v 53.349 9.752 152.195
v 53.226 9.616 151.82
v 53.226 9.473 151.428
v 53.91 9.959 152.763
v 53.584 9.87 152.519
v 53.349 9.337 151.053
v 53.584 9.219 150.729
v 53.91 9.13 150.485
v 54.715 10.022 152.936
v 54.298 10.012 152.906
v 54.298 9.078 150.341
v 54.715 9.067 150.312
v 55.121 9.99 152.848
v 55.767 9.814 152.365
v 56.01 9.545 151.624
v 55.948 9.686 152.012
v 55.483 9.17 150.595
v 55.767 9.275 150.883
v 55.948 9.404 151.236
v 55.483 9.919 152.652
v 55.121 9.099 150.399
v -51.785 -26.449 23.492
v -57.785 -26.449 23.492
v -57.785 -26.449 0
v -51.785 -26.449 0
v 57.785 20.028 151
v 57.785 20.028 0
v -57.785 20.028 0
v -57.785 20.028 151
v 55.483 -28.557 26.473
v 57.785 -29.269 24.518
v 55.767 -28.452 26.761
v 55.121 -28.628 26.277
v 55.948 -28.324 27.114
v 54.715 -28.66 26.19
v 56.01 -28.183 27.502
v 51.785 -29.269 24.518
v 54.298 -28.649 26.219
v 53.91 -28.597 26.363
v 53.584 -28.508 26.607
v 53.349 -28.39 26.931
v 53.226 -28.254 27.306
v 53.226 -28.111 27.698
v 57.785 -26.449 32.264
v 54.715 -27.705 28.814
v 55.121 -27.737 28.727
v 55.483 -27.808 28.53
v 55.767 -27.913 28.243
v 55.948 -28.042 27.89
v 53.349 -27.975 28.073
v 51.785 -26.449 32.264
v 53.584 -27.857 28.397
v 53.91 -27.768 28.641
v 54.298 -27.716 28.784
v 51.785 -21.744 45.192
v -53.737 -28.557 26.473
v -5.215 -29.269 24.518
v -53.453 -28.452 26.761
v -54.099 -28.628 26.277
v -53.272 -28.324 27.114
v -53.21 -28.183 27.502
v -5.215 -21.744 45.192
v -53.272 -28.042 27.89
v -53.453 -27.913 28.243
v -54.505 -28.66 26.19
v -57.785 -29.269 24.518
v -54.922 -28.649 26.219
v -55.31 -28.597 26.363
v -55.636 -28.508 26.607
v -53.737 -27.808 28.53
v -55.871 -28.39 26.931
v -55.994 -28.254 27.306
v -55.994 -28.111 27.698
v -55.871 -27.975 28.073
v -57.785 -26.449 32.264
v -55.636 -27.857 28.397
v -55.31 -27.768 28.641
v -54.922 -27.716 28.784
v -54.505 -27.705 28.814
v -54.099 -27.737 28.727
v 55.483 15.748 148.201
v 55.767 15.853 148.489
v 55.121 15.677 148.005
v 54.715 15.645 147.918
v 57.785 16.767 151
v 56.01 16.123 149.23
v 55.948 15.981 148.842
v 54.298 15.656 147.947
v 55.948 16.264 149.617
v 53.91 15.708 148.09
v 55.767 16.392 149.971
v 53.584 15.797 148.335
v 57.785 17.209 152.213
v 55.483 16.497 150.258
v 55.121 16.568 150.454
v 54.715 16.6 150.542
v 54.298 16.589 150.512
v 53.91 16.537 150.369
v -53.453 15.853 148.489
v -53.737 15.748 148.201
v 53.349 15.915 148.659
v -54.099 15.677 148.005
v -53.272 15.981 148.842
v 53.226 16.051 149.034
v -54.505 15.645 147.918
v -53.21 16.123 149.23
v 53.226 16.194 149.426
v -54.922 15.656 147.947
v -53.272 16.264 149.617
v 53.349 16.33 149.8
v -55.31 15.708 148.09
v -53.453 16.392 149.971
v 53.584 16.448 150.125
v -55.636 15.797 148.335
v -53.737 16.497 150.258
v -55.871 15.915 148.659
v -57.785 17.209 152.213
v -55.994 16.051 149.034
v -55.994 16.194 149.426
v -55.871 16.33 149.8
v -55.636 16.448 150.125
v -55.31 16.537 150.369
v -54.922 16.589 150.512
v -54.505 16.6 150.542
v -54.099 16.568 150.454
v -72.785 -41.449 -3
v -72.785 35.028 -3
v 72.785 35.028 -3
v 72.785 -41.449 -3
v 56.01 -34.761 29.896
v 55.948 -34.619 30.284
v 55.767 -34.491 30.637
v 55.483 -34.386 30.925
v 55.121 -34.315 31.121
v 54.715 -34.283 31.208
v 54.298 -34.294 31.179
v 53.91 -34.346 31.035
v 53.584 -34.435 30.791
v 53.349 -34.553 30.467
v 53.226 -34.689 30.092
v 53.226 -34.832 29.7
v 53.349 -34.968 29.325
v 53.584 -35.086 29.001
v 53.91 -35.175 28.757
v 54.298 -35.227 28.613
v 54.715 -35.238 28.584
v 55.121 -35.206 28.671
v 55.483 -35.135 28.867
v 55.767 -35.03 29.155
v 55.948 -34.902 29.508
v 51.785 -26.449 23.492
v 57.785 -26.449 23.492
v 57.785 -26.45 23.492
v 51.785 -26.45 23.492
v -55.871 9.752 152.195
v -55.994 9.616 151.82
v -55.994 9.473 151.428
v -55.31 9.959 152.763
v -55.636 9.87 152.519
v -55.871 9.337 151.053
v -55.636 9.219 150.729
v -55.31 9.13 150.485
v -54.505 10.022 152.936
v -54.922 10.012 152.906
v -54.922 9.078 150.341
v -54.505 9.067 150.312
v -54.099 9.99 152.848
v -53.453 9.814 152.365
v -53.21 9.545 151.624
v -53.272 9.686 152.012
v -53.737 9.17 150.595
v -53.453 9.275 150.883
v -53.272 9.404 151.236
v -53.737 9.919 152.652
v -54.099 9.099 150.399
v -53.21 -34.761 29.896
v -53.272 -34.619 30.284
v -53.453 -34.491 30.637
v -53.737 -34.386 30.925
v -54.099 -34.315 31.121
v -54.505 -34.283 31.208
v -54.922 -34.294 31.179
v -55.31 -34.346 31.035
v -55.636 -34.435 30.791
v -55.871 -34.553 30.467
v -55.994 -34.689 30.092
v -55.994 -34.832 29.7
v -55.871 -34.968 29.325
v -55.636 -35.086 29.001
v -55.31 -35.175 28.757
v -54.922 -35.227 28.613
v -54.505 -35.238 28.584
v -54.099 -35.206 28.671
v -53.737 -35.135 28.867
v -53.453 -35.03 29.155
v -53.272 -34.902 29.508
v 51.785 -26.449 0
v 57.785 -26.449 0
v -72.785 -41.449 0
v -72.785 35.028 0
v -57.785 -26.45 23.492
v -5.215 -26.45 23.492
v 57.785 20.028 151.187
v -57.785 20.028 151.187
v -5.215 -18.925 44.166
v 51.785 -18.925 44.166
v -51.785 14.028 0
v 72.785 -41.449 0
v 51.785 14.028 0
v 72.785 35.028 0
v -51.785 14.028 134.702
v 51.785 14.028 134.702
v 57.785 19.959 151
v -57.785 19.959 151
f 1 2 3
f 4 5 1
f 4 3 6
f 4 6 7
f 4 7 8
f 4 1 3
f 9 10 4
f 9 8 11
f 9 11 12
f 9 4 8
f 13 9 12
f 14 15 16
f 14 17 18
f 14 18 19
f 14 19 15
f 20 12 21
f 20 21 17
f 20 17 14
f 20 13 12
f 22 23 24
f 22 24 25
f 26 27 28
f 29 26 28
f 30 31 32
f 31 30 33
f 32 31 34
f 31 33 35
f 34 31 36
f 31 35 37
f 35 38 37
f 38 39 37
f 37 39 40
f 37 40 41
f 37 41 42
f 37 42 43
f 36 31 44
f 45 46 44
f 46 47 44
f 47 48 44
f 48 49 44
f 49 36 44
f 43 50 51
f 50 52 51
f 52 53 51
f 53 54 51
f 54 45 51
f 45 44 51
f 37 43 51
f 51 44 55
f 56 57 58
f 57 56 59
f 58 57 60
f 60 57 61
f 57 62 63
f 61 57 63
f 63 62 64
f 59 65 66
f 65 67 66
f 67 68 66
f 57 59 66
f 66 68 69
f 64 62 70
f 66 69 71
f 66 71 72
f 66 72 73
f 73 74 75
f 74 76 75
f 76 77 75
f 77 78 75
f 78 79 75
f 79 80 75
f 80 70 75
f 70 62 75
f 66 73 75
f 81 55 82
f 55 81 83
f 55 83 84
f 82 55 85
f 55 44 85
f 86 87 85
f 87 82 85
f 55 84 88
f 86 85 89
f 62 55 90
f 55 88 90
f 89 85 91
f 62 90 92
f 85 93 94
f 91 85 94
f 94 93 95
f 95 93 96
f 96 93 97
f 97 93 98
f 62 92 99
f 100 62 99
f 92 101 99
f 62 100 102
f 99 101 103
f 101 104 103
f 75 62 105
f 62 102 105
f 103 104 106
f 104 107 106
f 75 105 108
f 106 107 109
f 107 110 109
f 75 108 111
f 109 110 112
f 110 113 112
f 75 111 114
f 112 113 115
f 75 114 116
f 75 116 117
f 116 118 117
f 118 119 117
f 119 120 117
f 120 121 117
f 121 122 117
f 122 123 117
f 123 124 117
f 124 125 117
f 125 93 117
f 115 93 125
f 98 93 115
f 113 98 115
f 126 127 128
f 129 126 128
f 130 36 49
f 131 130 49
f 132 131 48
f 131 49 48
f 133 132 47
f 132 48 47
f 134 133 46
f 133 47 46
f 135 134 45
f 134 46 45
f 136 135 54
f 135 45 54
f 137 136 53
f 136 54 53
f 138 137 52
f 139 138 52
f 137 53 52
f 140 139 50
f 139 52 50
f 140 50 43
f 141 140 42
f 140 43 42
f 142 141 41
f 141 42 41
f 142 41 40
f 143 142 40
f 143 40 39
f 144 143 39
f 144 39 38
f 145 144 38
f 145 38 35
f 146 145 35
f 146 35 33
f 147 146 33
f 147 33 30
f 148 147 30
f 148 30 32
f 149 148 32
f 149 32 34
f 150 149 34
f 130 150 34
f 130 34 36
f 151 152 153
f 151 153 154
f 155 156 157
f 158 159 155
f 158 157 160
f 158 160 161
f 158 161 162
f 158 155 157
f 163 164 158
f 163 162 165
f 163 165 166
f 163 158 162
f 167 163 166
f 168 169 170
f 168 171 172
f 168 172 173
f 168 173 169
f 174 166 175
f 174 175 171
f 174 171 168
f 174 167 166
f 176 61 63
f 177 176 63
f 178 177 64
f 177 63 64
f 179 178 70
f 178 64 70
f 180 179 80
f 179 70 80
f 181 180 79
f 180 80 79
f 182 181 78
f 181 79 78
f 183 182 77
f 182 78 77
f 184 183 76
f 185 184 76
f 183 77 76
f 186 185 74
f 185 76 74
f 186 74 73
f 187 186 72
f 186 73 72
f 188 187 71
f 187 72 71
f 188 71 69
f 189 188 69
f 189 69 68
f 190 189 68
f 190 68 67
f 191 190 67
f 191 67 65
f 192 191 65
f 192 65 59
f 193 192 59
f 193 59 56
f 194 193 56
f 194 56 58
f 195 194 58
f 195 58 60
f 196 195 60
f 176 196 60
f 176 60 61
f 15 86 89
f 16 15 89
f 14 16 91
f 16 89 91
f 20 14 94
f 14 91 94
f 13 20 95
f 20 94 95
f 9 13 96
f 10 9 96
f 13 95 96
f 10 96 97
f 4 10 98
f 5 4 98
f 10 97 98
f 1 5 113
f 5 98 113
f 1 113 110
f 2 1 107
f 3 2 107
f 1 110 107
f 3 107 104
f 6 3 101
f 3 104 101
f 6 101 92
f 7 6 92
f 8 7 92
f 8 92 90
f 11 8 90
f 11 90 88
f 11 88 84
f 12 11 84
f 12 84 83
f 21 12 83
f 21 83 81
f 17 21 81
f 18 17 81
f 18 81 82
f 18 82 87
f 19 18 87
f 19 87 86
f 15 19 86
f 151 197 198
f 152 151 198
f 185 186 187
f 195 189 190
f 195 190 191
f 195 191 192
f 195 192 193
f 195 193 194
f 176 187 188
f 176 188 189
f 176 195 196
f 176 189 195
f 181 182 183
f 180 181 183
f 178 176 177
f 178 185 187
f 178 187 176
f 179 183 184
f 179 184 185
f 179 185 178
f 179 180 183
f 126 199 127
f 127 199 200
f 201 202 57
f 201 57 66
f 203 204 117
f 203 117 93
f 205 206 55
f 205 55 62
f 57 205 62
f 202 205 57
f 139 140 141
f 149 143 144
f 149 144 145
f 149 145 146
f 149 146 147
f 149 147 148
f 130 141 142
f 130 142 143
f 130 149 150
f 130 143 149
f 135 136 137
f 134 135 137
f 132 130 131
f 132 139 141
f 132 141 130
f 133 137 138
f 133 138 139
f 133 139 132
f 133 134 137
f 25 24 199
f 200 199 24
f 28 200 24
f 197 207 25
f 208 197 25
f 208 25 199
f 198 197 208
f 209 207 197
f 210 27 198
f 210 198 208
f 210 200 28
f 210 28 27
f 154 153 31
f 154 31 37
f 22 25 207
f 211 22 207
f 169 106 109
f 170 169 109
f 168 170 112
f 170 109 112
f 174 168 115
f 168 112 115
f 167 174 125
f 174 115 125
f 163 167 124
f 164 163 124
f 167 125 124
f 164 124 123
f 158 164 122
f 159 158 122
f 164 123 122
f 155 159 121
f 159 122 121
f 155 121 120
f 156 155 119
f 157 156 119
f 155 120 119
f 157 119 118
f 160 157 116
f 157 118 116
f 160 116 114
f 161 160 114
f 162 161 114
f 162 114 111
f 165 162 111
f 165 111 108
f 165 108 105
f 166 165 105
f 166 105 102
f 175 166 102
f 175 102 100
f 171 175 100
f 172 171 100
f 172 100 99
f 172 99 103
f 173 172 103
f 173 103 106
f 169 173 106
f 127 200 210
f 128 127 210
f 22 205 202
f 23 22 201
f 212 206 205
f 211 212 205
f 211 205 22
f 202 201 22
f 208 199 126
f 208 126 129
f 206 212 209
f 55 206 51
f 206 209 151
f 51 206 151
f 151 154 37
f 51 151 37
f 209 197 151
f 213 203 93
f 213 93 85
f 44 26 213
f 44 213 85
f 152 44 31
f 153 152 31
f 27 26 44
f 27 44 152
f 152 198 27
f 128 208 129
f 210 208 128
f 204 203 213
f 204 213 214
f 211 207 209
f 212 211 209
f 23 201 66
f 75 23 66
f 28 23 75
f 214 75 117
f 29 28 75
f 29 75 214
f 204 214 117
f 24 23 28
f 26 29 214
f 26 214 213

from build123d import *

# Parameters (mm, degrees)
SKETCH001_W  = 145.57
SKETCH001_H  = 76.477117
PAD_DEPTH    = 3
PAD001_DEPTH = 151
SKETCH004_W  = 234.832214
SKETCH004_H  = 173.073643
POCKET_DEPTH = 200
PAD002_DEPTH = 3
SKETCH003_R  = 1.4
PAD003_DEPTH = 10


with BuildPart() as part:
    # Sketch001 → Pad (new body)
    with BuildSketch(Plane.XY):
        with Locations((0, -3.210938)):
            Rectangle(SKETCH001_W, SKETCH001_H)
    extrude(amount=-PAD_DEPTH)

    # Sketch → Pad001 (join)
    with BuildSketch(Plane.XY):
        Polygon((51.785, -26.449496), (57.785, -26.449496), (57.785, 20.027621), (-57.785, 20.027621), (-57.785, -26.449496), (-51.785, -26.449496), (-51.785, 14.027621), (51.785, 14.027621), align=None)
    extrude(amount=PAD001_DEPTH)

    # Sketch004 (on DatumPlane) → Pocket (cut)
    with BuildSketch(Plane(origin=(0, -37.819078, 1.02606), x_dir=(1, 0, 0), z_dir=(0, -0.939693, 0.34202))):
        with Locations((5.697174, 86.536822)):
            Rectangle(SKETCH004_W, SKETCH004_H)
    extrude(amount=POCKET_DEPTH, mode=Mode.SUBTRACT)

    # Sketch002 (on DatumPlane) → Pad002 (join)
    with BuildSketch(Plane(origin=(0, -35, 0), x_dir=(1, 0, 0), z_dir=(0, -0.939693, 0.34202))):
        Polygon((-57.785, 160.89), (57.785, 160.89), (57.785, 25), (51.785, 25), (51.785, 47), (-5.215, 47), (-5.215, 25), (-57.785, 25), align=None)
    extrude(amount=PAD002_DEPTH)

    # Sketch003 (on DatumPlane) → Pad003 (join)
    with BuildSketch(Plane(origin=(0, -35, 0), x_dir=(1, 0, 0), z_dir=(0, -0.939693, 0.34202))):
        with Locations((-54.61, 157.715)):
            Circle(SKETCH003_R)
        with Locations((54.61, 157.715)):
            Circle(SKETCH003_R)
        with Locations((54.61, 28.175)):
            Circle(SKETCH003_R)
        with Locations((-54.61, 28.175)):
            Circle(SKETCH003_R)
    extrude(amount=PAD003_DEPTH)


solid = part.part
